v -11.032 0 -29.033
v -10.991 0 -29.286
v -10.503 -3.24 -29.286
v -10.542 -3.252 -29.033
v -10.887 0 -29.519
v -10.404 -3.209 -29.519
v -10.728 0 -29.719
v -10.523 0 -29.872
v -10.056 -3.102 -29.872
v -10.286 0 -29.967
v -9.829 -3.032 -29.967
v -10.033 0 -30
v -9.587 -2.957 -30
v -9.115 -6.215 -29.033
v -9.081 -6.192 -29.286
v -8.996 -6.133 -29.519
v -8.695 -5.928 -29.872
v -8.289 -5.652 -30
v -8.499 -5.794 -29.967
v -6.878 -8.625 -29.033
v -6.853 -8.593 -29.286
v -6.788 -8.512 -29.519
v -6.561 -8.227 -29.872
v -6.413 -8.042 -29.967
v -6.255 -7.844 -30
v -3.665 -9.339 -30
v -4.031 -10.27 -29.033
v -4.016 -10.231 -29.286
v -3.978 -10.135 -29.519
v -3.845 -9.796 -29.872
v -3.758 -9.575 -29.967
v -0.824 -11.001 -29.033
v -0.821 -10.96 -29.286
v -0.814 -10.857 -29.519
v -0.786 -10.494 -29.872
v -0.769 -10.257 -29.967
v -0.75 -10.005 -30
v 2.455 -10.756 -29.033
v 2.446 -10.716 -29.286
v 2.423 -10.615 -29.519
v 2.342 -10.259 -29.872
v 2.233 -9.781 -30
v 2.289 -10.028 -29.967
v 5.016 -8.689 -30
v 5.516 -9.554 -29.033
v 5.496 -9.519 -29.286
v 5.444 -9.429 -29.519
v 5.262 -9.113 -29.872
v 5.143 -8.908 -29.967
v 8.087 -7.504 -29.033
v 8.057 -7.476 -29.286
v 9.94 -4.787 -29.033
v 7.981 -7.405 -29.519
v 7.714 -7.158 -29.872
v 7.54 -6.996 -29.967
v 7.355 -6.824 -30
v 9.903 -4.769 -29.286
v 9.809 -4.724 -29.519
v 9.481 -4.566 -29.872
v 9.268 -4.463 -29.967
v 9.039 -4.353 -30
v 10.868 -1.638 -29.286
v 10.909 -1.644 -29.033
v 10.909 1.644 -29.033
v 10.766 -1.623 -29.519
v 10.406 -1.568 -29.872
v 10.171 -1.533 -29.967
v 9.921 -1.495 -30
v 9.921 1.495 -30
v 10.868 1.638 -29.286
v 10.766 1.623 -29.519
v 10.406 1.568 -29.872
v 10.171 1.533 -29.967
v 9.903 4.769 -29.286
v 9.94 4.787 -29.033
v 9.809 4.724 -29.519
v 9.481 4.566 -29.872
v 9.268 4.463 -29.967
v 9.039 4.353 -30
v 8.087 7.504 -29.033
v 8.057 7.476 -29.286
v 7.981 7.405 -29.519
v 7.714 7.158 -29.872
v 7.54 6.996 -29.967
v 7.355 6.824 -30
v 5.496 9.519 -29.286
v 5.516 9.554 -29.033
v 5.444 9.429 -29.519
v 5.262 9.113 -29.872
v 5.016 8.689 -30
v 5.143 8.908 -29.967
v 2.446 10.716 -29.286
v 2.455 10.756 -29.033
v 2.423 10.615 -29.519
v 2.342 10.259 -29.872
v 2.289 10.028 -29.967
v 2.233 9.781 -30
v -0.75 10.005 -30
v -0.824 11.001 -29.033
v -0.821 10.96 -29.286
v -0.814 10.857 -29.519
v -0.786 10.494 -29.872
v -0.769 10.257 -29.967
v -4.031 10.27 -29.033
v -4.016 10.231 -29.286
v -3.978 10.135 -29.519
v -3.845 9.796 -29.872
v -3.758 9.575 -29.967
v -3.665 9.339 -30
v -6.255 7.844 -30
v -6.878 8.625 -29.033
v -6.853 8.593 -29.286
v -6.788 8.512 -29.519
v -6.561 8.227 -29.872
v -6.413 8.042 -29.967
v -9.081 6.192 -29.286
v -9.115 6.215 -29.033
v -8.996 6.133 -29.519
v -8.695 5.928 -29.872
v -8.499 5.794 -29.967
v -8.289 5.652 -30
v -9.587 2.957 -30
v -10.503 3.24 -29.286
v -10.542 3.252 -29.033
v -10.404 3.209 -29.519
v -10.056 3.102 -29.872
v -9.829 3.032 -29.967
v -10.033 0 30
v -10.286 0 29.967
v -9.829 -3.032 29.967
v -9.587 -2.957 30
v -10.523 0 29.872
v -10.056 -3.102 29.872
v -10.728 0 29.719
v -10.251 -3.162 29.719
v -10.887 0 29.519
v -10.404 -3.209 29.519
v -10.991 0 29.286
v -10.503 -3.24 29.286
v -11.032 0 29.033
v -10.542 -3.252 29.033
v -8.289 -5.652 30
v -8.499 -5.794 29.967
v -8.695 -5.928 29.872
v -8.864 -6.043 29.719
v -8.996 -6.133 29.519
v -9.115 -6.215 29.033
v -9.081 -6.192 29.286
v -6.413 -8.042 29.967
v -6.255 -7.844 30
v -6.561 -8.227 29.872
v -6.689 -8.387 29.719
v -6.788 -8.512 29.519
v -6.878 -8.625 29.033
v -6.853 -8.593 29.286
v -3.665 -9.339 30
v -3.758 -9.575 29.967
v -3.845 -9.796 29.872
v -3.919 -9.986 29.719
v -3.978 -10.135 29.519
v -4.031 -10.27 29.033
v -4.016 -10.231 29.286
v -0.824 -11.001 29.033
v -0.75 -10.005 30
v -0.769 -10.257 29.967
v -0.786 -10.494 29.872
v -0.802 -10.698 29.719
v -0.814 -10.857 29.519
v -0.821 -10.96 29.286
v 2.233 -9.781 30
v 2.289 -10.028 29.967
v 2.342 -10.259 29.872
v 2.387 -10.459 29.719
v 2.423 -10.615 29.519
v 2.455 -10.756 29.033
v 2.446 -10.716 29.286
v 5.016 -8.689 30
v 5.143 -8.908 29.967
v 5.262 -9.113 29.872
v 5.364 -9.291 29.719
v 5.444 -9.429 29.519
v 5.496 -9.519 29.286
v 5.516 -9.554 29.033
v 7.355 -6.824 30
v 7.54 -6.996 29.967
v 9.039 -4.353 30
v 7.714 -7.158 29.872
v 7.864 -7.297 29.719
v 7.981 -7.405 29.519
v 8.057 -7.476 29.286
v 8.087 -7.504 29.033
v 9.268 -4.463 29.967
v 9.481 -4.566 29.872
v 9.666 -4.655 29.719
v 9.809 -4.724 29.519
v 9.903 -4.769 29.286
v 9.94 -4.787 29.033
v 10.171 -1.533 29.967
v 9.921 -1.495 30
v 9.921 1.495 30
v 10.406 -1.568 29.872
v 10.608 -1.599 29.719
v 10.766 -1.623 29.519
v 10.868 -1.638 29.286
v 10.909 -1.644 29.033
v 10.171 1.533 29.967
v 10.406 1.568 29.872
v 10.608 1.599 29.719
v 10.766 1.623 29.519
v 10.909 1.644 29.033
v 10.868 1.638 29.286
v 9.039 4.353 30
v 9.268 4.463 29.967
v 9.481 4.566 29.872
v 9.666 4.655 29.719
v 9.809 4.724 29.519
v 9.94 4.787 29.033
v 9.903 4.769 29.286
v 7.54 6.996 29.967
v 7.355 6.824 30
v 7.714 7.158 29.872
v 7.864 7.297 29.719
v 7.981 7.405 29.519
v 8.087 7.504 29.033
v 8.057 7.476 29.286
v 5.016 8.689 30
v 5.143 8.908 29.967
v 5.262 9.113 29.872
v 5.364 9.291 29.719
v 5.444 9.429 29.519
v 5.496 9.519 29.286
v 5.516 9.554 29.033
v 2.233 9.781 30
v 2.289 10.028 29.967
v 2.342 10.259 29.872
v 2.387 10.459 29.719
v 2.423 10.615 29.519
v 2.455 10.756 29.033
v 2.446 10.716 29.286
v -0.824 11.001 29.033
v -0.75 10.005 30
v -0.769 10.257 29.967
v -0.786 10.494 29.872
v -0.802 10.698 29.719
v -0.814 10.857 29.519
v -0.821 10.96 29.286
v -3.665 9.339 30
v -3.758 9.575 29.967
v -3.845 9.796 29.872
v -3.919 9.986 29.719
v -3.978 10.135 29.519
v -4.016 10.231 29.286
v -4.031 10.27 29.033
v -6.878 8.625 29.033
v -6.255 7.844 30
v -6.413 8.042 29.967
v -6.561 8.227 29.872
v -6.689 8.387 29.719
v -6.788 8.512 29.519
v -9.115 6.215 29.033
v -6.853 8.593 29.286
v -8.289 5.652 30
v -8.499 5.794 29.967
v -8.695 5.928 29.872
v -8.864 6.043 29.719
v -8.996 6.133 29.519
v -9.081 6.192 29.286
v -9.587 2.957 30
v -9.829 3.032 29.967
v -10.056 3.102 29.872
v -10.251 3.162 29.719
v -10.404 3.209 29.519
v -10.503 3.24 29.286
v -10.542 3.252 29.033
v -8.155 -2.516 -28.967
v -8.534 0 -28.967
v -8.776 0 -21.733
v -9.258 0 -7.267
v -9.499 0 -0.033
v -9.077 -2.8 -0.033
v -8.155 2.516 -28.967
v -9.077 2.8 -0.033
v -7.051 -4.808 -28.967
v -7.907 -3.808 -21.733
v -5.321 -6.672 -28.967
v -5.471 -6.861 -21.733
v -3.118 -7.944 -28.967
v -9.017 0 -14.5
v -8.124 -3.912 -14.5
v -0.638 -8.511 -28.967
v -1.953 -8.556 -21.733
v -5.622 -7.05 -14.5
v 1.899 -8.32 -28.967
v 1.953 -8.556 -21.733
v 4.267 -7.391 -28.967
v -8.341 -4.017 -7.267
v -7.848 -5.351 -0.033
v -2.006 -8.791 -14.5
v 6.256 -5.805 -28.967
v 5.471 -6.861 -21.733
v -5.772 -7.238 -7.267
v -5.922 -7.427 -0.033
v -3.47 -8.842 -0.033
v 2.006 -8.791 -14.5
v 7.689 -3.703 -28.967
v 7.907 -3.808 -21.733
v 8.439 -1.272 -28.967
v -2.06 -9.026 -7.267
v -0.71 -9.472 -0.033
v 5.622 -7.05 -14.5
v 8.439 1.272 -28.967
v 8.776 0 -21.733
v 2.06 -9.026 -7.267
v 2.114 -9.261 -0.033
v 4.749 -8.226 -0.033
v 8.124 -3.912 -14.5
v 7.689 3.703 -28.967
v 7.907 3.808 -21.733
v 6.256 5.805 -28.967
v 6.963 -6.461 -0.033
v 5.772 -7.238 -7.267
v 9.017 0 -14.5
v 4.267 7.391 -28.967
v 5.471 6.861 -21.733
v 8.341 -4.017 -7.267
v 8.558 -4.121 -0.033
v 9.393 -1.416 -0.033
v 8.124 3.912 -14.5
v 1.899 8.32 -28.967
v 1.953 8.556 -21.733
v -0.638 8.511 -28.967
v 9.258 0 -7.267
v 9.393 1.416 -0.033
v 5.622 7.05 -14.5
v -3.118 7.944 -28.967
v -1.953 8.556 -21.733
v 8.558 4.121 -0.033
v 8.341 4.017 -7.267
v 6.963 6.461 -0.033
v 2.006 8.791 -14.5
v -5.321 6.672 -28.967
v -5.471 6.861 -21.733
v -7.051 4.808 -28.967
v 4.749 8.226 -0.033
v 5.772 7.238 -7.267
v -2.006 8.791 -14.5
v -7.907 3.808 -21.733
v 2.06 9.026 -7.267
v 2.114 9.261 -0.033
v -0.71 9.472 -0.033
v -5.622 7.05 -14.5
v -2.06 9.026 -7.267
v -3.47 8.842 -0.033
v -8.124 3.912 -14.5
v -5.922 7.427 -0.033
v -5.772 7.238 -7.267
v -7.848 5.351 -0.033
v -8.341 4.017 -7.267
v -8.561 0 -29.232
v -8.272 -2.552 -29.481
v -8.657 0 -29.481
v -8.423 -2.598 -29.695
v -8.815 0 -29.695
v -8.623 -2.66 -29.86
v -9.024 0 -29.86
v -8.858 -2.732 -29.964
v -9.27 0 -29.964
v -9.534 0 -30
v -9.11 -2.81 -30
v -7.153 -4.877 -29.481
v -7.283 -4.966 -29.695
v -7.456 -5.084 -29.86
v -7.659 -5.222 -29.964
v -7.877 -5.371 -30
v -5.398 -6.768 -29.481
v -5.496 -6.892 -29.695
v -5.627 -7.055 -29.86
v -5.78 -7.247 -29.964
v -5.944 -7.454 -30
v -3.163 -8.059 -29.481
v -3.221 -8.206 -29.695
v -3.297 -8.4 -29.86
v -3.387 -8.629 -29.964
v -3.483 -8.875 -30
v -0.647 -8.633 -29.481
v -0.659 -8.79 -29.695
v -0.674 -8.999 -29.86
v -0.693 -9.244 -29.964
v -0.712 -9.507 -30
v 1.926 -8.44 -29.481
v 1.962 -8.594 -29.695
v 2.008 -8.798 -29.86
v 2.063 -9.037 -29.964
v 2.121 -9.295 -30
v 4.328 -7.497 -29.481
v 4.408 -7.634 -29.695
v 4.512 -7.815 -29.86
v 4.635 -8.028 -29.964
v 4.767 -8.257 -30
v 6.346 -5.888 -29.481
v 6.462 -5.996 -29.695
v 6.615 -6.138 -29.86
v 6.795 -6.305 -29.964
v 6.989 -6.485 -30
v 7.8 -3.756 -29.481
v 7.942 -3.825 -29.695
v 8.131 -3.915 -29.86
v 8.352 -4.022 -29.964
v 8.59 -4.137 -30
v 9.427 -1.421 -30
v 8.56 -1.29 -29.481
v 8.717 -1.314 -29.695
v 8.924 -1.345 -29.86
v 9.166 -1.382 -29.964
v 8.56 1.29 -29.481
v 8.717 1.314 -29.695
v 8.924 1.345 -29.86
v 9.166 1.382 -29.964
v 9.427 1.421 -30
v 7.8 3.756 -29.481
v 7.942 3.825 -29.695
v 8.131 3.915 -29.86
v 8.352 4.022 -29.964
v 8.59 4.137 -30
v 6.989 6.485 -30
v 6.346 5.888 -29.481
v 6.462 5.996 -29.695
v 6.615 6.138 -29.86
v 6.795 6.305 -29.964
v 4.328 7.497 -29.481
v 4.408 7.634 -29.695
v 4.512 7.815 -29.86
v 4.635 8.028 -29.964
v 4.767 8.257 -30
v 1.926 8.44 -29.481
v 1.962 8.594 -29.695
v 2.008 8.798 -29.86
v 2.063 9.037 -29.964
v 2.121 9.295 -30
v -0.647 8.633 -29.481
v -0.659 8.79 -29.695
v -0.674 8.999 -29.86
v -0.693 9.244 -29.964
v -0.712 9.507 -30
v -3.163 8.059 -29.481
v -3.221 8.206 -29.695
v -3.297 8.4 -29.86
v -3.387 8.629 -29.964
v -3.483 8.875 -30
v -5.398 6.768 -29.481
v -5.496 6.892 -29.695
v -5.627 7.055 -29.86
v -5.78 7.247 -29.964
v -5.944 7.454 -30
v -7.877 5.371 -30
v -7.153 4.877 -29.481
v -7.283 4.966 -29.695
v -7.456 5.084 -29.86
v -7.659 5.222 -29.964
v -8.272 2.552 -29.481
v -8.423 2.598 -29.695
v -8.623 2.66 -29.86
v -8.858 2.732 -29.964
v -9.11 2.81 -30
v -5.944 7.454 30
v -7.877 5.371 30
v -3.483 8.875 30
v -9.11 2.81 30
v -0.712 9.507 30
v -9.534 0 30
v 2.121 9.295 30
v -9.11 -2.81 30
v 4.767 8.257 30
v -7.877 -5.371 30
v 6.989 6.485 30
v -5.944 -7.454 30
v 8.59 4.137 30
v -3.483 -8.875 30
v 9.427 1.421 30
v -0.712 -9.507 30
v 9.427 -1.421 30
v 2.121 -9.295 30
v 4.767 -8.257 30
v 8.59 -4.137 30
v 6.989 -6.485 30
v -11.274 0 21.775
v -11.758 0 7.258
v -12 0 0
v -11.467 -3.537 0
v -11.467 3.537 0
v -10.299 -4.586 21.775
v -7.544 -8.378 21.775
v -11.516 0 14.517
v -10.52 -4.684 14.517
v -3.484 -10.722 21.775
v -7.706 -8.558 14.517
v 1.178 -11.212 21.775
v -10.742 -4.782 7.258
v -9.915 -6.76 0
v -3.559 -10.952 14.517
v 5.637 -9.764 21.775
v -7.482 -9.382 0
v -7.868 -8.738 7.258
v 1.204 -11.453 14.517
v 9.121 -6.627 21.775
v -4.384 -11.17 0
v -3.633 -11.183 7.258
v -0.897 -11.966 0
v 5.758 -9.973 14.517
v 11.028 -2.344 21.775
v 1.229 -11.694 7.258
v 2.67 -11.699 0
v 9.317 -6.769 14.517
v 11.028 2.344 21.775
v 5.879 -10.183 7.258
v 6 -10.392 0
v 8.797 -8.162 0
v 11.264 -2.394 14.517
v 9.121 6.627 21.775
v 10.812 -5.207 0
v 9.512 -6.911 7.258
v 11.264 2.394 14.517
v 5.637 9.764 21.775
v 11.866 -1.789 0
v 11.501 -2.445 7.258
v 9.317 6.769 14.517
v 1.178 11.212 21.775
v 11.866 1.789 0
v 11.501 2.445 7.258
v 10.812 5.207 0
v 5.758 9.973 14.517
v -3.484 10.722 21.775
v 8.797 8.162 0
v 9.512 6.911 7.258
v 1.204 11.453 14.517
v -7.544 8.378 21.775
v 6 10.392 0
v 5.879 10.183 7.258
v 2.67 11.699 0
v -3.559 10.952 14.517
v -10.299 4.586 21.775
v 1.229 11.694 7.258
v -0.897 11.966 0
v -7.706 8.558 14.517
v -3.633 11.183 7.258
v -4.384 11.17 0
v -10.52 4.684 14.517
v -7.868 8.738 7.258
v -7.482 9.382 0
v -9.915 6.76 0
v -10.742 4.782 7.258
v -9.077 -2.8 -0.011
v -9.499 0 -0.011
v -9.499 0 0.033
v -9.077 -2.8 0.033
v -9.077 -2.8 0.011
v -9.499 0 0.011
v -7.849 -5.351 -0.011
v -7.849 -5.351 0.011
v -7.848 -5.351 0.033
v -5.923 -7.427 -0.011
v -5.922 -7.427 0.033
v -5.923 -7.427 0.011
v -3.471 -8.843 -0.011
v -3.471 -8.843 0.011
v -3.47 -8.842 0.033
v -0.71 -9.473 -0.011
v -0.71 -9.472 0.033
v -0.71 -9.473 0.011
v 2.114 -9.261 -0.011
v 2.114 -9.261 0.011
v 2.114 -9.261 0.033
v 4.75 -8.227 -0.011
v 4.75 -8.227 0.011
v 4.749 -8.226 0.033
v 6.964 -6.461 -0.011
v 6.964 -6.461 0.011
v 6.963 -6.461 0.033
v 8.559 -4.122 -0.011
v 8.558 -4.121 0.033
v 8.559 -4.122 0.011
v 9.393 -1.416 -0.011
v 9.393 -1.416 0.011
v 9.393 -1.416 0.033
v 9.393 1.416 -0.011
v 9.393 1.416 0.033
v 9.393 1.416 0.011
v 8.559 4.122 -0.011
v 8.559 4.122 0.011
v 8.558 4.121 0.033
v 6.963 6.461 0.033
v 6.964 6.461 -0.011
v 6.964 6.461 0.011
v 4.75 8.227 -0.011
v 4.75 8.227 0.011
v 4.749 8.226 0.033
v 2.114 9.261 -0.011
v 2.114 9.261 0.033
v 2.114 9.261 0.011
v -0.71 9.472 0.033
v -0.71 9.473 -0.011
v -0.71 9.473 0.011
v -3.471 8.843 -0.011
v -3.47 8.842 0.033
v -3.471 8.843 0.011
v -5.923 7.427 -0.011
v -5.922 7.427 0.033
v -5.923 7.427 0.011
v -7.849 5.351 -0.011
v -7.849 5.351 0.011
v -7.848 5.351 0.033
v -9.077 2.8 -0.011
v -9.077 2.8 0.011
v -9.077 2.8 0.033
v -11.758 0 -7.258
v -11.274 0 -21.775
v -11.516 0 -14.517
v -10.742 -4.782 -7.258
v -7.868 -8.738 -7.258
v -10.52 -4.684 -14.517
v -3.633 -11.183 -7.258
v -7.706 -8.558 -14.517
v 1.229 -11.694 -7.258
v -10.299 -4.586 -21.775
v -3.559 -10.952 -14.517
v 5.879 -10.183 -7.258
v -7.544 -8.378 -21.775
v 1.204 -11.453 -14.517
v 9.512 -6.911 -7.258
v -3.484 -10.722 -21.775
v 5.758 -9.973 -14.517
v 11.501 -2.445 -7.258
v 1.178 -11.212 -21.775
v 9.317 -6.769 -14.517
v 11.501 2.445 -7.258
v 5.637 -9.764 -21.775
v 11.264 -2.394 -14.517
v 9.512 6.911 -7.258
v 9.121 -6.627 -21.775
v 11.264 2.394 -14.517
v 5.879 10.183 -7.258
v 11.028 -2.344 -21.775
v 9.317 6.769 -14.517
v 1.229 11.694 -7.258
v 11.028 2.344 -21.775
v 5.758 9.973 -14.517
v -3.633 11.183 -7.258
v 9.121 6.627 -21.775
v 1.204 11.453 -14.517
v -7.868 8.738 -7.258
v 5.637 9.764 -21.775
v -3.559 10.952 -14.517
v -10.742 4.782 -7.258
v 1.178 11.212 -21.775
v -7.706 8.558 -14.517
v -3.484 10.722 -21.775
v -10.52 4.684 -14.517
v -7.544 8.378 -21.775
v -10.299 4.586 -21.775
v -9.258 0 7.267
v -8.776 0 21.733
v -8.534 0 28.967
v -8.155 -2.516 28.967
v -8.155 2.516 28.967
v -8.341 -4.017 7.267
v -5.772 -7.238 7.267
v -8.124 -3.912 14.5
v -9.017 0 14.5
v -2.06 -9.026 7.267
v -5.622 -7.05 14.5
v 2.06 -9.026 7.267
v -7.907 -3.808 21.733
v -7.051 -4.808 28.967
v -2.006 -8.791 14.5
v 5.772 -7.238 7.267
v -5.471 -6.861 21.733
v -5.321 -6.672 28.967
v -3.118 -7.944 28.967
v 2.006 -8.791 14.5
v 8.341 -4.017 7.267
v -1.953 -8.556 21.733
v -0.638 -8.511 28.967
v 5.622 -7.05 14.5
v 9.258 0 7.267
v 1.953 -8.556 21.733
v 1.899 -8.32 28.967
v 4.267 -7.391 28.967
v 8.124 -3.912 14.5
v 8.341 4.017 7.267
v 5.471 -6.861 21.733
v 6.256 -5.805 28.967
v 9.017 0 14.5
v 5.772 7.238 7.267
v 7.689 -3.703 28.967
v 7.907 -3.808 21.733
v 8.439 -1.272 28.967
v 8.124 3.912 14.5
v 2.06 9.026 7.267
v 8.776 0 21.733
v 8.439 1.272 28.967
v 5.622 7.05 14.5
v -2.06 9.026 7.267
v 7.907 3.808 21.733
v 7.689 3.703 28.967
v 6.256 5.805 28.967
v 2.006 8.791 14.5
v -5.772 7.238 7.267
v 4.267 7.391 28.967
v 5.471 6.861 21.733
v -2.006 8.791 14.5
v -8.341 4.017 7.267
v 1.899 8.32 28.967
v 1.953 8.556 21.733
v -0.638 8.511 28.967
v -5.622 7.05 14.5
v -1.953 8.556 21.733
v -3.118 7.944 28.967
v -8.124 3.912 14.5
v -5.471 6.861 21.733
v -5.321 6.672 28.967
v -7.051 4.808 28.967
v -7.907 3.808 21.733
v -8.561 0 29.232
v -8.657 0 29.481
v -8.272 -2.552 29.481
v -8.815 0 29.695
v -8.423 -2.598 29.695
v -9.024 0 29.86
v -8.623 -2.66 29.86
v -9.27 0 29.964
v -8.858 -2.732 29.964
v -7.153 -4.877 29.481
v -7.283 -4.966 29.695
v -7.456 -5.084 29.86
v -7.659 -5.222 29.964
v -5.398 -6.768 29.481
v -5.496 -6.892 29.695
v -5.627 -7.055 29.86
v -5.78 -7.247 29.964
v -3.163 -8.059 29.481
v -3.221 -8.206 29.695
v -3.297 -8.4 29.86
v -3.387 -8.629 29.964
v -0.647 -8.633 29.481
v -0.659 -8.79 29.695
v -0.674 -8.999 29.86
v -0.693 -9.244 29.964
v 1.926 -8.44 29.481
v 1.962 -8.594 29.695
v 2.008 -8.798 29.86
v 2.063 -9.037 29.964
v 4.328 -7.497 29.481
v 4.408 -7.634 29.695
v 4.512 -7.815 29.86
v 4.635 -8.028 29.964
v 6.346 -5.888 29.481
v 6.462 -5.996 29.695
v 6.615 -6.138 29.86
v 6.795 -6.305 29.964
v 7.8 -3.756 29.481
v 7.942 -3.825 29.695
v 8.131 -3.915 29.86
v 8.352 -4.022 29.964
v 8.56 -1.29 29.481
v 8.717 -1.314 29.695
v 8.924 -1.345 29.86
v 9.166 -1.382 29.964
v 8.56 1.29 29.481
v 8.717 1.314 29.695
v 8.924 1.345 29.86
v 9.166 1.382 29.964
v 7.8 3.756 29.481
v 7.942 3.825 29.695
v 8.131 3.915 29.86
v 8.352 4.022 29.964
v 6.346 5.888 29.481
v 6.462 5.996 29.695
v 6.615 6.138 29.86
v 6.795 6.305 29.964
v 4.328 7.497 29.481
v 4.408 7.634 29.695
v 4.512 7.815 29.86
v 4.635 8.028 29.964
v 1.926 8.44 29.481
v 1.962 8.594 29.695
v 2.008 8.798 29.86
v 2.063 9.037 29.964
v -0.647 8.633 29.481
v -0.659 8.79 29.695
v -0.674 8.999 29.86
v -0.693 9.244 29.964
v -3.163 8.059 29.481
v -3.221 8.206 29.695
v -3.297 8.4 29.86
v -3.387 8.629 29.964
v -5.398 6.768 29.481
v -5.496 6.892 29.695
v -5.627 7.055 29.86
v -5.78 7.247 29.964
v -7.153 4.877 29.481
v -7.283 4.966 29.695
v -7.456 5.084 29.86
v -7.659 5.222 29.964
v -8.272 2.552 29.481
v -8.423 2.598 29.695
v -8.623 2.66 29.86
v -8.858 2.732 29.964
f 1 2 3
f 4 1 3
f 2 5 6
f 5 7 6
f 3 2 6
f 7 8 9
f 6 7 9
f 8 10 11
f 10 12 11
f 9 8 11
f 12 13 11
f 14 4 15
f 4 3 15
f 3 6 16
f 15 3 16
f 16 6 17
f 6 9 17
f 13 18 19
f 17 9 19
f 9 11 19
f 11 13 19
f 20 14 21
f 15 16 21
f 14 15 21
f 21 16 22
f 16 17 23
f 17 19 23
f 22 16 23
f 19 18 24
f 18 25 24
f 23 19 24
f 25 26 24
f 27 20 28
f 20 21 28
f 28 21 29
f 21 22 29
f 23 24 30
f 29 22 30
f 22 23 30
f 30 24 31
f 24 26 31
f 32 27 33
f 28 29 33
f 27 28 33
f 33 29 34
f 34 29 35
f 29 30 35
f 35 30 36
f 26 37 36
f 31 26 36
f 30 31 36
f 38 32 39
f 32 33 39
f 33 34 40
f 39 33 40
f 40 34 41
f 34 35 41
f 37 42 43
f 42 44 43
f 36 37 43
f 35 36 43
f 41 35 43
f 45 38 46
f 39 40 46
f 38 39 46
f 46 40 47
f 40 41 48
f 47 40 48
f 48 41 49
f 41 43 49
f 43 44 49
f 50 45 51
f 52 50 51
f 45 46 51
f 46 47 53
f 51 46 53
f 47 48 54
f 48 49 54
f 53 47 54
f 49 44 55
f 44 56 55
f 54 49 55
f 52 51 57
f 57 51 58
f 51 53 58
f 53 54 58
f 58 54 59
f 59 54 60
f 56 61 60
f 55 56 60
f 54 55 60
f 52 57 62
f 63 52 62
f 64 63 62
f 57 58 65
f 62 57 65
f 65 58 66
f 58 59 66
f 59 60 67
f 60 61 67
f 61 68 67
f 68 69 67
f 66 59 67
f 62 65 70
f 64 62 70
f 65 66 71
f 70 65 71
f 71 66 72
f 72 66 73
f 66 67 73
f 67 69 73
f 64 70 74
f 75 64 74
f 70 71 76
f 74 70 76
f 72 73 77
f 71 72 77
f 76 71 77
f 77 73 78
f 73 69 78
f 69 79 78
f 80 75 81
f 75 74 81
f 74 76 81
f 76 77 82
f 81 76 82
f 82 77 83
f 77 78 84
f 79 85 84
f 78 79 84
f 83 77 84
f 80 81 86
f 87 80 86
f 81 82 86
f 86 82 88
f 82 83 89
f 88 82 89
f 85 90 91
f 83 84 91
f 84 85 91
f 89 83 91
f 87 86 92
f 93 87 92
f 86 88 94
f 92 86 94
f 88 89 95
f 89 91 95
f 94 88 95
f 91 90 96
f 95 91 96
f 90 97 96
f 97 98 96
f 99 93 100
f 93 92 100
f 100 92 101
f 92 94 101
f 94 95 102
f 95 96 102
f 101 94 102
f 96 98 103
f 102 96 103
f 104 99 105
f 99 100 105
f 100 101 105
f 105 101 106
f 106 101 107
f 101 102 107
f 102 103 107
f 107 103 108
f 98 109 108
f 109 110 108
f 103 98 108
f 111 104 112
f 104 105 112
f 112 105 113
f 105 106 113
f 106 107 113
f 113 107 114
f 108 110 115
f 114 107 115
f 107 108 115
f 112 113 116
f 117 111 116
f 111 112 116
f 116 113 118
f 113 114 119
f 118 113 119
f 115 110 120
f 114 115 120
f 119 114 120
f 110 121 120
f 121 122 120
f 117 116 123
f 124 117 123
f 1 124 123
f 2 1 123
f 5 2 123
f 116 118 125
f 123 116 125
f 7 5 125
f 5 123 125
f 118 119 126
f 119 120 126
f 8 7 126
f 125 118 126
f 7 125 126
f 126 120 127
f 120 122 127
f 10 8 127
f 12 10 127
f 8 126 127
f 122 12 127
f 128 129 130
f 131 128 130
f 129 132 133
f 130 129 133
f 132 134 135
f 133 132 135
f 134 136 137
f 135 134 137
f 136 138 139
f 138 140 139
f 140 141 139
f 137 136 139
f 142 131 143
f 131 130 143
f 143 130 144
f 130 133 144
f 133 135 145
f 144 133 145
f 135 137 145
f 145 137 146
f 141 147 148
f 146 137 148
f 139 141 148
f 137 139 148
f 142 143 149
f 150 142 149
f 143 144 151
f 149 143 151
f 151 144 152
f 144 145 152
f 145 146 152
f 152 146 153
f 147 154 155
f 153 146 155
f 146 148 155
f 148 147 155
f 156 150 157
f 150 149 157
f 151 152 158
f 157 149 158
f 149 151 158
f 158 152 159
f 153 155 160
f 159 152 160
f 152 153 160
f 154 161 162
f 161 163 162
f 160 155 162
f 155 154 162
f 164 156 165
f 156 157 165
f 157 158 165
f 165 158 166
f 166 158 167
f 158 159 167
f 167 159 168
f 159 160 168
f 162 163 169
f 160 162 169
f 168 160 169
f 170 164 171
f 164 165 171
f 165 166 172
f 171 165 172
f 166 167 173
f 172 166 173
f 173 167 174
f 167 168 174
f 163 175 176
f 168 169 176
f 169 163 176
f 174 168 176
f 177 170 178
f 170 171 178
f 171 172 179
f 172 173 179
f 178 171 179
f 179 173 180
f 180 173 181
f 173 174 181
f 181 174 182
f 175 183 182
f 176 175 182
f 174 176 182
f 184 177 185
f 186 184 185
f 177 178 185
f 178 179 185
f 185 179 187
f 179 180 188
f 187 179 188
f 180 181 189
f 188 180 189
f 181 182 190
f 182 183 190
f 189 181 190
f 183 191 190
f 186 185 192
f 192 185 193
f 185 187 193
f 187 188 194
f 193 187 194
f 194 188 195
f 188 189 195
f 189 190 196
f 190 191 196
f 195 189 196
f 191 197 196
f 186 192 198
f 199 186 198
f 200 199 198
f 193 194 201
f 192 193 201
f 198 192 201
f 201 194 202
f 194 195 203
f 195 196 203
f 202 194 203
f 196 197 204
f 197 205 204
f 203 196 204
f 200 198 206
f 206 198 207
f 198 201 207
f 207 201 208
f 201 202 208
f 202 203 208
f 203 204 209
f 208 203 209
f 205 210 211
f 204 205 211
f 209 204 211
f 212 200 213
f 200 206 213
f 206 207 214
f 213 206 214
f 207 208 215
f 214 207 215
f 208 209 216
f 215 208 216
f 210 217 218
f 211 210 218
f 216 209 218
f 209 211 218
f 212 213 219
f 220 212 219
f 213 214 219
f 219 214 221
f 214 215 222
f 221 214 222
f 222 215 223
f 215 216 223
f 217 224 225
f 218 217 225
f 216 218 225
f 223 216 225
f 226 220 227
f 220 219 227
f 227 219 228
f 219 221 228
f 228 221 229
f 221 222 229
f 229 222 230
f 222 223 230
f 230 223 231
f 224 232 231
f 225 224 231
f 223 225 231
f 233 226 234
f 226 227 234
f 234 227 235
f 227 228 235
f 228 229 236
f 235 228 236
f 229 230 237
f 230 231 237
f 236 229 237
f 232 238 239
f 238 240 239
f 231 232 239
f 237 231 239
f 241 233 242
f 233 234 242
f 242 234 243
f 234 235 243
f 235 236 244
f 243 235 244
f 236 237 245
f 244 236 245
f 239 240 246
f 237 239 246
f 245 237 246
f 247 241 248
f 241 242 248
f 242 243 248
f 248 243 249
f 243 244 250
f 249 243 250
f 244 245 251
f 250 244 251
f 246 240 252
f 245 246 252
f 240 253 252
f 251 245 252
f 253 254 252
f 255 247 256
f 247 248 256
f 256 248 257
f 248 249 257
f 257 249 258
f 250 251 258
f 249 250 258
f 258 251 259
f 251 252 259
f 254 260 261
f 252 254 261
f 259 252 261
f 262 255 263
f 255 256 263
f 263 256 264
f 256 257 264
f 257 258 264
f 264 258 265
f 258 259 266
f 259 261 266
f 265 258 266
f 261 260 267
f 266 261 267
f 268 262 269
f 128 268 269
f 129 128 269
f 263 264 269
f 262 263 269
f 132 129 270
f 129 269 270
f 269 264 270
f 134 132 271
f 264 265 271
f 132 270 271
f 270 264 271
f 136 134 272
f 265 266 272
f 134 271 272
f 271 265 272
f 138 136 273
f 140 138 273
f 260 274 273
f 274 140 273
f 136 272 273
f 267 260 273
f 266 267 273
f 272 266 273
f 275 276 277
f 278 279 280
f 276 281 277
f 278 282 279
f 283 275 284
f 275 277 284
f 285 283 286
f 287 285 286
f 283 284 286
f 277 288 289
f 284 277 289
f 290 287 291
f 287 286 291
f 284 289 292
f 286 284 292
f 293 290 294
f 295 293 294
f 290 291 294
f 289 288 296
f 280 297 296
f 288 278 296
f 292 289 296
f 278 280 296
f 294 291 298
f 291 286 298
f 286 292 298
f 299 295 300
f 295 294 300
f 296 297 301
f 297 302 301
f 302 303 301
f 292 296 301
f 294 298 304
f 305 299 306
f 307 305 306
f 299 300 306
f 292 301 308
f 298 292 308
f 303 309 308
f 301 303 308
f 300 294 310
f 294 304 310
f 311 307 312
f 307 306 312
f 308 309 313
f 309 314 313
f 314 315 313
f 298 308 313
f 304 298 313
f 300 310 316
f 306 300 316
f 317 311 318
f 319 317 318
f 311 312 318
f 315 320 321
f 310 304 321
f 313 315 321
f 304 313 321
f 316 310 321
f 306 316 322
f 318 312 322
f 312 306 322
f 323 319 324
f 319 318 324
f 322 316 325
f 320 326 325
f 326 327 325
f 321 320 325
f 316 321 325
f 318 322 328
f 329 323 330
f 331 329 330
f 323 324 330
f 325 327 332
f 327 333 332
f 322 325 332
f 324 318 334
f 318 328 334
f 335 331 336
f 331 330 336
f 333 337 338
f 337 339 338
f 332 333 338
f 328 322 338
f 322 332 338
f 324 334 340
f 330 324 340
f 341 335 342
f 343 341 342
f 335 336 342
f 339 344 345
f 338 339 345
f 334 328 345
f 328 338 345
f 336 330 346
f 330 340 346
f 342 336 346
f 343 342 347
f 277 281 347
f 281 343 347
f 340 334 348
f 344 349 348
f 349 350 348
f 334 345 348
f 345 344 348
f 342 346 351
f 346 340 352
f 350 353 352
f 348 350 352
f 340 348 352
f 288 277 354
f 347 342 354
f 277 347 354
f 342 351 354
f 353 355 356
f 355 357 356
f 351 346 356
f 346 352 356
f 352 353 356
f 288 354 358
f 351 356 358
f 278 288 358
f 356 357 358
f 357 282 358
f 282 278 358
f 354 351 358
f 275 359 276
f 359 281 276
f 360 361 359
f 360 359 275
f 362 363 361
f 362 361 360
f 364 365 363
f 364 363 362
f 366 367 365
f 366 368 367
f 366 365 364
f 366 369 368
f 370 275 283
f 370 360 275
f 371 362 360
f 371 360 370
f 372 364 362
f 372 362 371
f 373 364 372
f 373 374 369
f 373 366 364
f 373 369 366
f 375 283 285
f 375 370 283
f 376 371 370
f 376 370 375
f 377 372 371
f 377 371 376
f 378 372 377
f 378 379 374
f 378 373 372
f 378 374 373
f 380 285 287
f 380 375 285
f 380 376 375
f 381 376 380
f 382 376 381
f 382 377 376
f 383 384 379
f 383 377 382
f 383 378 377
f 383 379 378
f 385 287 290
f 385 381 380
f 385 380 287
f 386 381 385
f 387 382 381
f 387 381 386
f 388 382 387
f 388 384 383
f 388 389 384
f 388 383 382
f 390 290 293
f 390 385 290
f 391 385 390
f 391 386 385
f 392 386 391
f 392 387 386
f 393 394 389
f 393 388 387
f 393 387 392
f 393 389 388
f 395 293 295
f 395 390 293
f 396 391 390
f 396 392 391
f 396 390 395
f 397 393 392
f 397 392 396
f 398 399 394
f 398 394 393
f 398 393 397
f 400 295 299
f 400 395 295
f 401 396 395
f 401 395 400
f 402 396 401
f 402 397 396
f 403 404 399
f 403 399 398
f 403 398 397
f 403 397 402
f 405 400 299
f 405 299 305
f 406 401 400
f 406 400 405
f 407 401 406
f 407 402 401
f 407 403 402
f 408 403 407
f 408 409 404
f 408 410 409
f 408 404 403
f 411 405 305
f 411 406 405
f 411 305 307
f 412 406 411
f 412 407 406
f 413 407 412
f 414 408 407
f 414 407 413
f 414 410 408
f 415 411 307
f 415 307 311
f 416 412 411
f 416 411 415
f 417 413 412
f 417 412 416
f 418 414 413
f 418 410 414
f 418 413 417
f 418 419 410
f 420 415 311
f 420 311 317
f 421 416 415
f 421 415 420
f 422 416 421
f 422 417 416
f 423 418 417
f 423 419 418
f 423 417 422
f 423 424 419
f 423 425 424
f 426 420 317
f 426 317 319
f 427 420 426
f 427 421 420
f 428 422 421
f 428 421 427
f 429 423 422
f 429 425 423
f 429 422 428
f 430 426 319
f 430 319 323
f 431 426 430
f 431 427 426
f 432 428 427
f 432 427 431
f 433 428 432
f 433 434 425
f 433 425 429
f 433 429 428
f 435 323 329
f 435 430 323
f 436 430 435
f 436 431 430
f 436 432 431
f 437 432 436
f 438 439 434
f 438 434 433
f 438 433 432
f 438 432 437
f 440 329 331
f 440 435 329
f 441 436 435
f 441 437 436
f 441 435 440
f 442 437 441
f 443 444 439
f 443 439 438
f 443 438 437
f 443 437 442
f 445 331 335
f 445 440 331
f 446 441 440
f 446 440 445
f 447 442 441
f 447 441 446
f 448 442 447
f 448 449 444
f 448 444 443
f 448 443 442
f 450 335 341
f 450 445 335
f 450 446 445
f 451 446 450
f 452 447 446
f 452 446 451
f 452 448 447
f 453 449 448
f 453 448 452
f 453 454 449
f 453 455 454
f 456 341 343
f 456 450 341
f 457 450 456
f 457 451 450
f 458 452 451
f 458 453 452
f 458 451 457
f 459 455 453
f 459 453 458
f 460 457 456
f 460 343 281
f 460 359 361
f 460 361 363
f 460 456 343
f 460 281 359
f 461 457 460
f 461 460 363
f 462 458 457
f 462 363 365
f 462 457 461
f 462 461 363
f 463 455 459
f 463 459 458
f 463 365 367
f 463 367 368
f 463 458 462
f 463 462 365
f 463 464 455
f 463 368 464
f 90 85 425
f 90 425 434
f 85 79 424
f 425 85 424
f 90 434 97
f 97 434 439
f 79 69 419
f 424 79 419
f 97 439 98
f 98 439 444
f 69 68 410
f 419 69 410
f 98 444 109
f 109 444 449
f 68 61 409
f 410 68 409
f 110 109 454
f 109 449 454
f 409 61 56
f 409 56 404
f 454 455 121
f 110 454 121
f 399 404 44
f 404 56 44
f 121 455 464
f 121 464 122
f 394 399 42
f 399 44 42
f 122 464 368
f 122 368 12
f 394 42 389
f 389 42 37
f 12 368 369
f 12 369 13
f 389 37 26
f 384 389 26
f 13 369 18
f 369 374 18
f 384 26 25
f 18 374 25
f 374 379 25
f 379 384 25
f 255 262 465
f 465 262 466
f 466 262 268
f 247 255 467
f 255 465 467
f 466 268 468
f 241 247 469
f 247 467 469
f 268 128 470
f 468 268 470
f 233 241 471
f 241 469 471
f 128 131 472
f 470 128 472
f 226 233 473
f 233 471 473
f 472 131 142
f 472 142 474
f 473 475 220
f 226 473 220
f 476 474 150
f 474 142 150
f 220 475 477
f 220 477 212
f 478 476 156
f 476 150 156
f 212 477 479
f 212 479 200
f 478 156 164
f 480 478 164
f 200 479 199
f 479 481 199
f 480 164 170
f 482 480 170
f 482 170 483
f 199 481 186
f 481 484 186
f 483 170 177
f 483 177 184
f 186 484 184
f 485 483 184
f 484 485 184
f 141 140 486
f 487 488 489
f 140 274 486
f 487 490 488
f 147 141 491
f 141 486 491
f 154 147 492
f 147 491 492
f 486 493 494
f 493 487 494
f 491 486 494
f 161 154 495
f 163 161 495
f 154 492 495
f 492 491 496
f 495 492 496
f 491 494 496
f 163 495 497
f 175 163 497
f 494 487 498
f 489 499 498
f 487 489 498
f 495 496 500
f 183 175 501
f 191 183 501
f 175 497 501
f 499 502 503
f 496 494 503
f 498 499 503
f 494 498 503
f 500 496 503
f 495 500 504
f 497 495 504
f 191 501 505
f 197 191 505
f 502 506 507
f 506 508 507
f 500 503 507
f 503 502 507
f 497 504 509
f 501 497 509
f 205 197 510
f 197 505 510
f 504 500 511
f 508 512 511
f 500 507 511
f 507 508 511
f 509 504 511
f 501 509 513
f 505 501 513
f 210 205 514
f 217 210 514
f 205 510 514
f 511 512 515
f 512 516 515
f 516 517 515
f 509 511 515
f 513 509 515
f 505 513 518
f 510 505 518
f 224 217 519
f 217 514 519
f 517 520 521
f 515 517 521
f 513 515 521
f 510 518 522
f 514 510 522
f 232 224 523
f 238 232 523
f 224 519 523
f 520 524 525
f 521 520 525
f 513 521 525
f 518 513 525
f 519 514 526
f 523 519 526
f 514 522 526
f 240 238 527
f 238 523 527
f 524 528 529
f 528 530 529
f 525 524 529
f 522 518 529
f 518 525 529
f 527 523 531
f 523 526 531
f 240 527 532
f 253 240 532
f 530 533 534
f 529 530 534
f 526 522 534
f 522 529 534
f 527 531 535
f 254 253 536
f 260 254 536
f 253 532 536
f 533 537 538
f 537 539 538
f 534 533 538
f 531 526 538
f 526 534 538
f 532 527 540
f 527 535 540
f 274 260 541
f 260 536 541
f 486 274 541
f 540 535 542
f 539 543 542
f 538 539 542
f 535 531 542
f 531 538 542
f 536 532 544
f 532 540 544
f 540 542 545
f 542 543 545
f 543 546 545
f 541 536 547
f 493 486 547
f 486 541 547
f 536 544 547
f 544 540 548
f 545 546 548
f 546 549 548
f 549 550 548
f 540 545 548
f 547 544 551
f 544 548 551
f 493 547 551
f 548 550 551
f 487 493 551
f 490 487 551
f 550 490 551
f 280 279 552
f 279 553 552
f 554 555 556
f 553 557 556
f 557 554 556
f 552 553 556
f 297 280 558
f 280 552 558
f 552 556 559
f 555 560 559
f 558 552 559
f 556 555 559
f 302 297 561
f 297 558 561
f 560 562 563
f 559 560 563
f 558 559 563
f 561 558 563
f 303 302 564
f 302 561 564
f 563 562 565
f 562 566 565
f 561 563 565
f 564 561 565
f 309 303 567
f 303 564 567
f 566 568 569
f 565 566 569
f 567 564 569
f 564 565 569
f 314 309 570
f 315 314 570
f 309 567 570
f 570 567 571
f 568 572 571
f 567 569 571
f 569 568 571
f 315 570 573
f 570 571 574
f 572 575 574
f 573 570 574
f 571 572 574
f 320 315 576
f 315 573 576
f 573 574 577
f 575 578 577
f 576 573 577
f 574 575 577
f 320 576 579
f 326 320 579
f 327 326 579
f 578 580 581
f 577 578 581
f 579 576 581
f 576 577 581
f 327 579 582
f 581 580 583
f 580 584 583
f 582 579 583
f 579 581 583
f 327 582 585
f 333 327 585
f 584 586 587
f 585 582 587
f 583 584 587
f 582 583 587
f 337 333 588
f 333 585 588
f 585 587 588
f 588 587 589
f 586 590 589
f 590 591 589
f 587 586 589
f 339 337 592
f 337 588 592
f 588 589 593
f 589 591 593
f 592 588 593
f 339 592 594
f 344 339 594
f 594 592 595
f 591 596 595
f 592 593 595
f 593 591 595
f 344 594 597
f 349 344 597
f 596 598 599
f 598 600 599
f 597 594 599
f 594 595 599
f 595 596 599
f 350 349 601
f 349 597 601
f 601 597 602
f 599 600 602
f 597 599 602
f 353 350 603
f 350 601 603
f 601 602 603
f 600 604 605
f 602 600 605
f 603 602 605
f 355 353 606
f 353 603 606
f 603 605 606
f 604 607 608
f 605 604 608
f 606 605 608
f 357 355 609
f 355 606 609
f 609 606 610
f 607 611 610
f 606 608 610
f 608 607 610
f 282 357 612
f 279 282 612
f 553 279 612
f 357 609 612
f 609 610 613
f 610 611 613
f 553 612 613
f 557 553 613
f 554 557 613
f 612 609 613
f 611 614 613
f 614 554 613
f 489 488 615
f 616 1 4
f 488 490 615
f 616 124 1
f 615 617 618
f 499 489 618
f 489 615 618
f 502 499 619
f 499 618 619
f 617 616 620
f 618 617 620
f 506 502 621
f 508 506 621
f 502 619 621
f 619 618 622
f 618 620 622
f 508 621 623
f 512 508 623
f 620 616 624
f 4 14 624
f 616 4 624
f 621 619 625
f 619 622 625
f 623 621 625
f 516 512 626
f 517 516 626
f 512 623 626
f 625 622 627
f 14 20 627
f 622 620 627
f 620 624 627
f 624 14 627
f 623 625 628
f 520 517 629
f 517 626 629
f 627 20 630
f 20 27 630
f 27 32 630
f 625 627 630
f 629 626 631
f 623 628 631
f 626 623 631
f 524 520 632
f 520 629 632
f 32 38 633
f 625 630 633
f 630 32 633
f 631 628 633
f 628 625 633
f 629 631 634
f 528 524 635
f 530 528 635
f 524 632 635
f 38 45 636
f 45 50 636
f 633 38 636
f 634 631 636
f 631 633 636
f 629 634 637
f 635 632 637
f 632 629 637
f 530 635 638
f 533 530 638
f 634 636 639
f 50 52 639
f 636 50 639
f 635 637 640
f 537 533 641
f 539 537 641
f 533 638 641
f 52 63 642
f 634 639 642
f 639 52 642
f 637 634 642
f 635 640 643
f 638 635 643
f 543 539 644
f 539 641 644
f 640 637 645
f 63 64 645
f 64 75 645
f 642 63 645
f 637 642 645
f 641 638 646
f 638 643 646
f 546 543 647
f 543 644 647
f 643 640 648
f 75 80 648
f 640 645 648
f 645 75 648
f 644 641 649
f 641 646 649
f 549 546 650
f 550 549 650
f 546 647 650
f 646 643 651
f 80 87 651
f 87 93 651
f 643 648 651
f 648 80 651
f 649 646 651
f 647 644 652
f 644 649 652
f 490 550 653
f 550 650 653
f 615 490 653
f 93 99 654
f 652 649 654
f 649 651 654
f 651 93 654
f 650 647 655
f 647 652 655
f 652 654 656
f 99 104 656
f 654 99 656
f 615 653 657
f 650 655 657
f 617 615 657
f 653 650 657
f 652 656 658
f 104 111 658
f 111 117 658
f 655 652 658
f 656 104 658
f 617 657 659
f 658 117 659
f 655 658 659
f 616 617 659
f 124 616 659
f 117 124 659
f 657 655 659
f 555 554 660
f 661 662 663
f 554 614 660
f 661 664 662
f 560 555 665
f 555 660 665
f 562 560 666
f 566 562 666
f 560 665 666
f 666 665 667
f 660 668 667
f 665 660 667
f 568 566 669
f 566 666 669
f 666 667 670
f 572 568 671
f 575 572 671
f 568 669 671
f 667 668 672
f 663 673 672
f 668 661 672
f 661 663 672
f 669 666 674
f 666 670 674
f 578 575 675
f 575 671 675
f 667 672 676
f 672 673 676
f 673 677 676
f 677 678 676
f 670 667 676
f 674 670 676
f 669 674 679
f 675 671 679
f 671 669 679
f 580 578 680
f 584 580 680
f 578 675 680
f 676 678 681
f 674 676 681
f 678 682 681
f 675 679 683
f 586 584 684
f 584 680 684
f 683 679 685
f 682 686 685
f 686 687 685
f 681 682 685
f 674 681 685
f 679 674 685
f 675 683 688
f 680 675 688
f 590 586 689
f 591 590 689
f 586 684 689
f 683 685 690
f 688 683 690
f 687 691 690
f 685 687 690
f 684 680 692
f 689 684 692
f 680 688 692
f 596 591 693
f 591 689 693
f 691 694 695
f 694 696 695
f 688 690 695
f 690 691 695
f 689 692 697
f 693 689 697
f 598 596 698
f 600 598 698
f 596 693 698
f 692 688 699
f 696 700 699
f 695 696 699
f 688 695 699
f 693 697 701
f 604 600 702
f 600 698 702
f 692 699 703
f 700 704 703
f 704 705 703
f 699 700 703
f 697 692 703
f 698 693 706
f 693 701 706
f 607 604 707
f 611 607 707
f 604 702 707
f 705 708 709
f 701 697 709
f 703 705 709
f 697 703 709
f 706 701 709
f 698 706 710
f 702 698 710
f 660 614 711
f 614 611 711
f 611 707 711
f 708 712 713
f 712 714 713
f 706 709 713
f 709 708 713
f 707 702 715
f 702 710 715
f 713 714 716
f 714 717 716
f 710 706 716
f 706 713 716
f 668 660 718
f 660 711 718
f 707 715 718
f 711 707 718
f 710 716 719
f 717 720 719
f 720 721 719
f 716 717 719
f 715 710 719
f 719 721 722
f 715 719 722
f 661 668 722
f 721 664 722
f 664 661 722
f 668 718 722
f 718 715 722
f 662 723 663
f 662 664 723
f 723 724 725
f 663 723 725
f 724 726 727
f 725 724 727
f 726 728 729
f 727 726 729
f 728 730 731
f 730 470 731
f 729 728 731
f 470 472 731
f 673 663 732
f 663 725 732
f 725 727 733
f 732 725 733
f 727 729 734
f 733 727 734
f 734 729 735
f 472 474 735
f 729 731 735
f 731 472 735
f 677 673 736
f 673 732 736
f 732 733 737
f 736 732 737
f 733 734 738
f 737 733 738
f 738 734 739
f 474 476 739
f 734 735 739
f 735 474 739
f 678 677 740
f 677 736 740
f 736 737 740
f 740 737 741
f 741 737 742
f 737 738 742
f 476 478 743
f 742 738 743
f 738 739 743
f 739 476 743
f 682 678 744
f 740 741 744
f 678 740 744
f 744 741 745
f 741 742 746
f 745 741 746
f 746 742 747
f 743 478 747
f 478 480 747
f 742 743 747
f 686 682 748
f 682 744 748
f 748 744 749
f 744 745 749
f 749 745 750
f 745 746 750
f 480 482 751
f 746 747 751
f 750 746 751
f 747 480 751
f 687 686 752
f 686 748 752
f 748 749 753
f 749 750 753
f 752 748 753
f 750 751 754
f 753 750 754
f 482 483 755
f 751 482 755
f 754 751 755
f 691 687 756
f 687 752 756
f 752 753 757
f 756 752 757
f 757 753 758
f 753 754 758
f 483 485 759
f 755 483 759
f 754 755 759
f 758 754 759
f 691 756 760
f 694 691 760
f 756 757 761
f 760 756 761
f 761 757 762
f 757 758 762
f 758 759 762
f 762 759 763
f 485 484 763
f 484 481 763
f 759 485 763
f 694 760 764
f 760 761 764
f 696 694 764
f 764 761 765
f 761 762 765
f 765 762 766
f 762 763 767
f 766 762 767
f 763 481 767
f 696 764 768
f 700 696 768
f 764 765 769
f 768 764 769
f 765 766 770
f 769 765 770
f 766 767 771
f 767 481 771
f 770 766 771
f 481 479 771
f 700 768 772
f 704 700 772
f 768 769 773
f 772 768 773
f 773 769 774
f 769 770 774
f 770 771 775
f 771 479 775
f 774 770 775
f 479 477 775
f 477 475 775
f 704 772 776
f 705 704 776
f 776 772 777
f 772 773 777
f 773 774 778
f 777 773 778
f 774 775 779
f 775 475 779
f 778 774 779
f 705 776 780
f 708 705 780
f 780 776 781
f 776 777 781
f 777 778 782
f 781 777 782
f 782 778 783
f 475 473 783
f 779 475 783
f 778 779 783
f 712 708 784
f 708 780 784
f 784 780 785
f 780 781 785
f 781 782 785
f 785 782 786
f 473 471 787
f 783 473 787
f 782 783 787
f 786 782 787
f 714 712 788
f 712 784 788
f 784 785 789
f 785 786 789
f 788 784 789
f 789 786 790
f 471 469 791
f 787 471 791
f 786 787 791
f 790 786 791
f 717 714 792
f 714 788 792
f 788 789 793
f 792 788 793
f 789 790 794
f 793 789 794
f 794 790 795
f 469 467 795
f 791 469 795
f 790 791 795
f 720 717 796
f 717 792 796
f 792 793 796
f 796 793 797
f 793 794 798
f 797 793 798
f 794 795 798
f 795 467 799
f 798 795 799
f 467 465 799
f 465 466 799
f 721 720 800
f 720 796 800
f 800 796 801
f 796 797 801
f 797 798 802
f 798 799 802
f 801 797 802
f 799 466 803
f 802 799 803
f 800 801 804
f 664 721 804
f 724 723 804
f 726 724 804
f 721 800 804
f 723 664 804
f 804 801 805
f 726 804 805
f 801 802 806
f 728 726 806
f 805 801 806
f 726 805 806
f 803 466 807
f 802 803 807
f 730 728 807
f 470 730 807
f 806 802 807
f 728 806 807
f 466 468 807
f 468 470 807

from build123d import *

# Parameters (mm, degrees)
FILLET3_R = 1
FILLET4_R = 1


with BuildPart() as part:
    # Sketch1 → Revolve1 (revolve)
    with BuildSketch(Plane(origin=(0, 0, 0), x_dir=(1, 0, 0), z_dir=(0, 1, 0)), mode=Mode.PRIVATE) as revolve1_sk:
        Polygon((8.5, 30), (9.5, 0), (8.5, -30), (11, -30), (12, 0), (11, 30), align=None)
    revolve(revolve1_sk.sketch.rotate(Axis((0, 0, -39.2734375), (0, 0, 1)), 180), axis=Axis((0, 0, -39.2734375), (0, 0, 1)))

    # Fillet3
    fillet3_edges = [part.edges().sort_by_distance(p)[0] for p in [
        (11, 0, -30),
        (12, 0, 0),
        (11, 0, 30),
        (8.5, 0, 30),
        (8.5, 0, -30),
    ]]
    fillet(fillet3_edges, radius=FILLET3_R)

    # Fillet4
    # the kernel refuses this fillet: 1 mm, written as the material it adds along each edge
    with BuildSketch(Plane(origin=(0, 0, 0), x_dir=(-1, 0, 0), z_dir=(0, 1, 0))) as fillet4_piece_1:
        with BuildLine():
            CenterArc((9.5 - FILLET4_R * 1.00055540132, 0), FILLET4_R, 358.090847567, 3.818304866)
            Line((9.5 - FILLET4_R * 0.00111049434109, FILLET4_R * 0.0333148302326), (9.5, 0))
            Line((9.5, 0), (9.5 - FILLET4_R * 0.00111049434109, -FILLET4_R * 0.0333148302326))
        make_face()
    revolve(axis=Axis((0, 0, 0), (0, 0, 1)))


solid = part.part
